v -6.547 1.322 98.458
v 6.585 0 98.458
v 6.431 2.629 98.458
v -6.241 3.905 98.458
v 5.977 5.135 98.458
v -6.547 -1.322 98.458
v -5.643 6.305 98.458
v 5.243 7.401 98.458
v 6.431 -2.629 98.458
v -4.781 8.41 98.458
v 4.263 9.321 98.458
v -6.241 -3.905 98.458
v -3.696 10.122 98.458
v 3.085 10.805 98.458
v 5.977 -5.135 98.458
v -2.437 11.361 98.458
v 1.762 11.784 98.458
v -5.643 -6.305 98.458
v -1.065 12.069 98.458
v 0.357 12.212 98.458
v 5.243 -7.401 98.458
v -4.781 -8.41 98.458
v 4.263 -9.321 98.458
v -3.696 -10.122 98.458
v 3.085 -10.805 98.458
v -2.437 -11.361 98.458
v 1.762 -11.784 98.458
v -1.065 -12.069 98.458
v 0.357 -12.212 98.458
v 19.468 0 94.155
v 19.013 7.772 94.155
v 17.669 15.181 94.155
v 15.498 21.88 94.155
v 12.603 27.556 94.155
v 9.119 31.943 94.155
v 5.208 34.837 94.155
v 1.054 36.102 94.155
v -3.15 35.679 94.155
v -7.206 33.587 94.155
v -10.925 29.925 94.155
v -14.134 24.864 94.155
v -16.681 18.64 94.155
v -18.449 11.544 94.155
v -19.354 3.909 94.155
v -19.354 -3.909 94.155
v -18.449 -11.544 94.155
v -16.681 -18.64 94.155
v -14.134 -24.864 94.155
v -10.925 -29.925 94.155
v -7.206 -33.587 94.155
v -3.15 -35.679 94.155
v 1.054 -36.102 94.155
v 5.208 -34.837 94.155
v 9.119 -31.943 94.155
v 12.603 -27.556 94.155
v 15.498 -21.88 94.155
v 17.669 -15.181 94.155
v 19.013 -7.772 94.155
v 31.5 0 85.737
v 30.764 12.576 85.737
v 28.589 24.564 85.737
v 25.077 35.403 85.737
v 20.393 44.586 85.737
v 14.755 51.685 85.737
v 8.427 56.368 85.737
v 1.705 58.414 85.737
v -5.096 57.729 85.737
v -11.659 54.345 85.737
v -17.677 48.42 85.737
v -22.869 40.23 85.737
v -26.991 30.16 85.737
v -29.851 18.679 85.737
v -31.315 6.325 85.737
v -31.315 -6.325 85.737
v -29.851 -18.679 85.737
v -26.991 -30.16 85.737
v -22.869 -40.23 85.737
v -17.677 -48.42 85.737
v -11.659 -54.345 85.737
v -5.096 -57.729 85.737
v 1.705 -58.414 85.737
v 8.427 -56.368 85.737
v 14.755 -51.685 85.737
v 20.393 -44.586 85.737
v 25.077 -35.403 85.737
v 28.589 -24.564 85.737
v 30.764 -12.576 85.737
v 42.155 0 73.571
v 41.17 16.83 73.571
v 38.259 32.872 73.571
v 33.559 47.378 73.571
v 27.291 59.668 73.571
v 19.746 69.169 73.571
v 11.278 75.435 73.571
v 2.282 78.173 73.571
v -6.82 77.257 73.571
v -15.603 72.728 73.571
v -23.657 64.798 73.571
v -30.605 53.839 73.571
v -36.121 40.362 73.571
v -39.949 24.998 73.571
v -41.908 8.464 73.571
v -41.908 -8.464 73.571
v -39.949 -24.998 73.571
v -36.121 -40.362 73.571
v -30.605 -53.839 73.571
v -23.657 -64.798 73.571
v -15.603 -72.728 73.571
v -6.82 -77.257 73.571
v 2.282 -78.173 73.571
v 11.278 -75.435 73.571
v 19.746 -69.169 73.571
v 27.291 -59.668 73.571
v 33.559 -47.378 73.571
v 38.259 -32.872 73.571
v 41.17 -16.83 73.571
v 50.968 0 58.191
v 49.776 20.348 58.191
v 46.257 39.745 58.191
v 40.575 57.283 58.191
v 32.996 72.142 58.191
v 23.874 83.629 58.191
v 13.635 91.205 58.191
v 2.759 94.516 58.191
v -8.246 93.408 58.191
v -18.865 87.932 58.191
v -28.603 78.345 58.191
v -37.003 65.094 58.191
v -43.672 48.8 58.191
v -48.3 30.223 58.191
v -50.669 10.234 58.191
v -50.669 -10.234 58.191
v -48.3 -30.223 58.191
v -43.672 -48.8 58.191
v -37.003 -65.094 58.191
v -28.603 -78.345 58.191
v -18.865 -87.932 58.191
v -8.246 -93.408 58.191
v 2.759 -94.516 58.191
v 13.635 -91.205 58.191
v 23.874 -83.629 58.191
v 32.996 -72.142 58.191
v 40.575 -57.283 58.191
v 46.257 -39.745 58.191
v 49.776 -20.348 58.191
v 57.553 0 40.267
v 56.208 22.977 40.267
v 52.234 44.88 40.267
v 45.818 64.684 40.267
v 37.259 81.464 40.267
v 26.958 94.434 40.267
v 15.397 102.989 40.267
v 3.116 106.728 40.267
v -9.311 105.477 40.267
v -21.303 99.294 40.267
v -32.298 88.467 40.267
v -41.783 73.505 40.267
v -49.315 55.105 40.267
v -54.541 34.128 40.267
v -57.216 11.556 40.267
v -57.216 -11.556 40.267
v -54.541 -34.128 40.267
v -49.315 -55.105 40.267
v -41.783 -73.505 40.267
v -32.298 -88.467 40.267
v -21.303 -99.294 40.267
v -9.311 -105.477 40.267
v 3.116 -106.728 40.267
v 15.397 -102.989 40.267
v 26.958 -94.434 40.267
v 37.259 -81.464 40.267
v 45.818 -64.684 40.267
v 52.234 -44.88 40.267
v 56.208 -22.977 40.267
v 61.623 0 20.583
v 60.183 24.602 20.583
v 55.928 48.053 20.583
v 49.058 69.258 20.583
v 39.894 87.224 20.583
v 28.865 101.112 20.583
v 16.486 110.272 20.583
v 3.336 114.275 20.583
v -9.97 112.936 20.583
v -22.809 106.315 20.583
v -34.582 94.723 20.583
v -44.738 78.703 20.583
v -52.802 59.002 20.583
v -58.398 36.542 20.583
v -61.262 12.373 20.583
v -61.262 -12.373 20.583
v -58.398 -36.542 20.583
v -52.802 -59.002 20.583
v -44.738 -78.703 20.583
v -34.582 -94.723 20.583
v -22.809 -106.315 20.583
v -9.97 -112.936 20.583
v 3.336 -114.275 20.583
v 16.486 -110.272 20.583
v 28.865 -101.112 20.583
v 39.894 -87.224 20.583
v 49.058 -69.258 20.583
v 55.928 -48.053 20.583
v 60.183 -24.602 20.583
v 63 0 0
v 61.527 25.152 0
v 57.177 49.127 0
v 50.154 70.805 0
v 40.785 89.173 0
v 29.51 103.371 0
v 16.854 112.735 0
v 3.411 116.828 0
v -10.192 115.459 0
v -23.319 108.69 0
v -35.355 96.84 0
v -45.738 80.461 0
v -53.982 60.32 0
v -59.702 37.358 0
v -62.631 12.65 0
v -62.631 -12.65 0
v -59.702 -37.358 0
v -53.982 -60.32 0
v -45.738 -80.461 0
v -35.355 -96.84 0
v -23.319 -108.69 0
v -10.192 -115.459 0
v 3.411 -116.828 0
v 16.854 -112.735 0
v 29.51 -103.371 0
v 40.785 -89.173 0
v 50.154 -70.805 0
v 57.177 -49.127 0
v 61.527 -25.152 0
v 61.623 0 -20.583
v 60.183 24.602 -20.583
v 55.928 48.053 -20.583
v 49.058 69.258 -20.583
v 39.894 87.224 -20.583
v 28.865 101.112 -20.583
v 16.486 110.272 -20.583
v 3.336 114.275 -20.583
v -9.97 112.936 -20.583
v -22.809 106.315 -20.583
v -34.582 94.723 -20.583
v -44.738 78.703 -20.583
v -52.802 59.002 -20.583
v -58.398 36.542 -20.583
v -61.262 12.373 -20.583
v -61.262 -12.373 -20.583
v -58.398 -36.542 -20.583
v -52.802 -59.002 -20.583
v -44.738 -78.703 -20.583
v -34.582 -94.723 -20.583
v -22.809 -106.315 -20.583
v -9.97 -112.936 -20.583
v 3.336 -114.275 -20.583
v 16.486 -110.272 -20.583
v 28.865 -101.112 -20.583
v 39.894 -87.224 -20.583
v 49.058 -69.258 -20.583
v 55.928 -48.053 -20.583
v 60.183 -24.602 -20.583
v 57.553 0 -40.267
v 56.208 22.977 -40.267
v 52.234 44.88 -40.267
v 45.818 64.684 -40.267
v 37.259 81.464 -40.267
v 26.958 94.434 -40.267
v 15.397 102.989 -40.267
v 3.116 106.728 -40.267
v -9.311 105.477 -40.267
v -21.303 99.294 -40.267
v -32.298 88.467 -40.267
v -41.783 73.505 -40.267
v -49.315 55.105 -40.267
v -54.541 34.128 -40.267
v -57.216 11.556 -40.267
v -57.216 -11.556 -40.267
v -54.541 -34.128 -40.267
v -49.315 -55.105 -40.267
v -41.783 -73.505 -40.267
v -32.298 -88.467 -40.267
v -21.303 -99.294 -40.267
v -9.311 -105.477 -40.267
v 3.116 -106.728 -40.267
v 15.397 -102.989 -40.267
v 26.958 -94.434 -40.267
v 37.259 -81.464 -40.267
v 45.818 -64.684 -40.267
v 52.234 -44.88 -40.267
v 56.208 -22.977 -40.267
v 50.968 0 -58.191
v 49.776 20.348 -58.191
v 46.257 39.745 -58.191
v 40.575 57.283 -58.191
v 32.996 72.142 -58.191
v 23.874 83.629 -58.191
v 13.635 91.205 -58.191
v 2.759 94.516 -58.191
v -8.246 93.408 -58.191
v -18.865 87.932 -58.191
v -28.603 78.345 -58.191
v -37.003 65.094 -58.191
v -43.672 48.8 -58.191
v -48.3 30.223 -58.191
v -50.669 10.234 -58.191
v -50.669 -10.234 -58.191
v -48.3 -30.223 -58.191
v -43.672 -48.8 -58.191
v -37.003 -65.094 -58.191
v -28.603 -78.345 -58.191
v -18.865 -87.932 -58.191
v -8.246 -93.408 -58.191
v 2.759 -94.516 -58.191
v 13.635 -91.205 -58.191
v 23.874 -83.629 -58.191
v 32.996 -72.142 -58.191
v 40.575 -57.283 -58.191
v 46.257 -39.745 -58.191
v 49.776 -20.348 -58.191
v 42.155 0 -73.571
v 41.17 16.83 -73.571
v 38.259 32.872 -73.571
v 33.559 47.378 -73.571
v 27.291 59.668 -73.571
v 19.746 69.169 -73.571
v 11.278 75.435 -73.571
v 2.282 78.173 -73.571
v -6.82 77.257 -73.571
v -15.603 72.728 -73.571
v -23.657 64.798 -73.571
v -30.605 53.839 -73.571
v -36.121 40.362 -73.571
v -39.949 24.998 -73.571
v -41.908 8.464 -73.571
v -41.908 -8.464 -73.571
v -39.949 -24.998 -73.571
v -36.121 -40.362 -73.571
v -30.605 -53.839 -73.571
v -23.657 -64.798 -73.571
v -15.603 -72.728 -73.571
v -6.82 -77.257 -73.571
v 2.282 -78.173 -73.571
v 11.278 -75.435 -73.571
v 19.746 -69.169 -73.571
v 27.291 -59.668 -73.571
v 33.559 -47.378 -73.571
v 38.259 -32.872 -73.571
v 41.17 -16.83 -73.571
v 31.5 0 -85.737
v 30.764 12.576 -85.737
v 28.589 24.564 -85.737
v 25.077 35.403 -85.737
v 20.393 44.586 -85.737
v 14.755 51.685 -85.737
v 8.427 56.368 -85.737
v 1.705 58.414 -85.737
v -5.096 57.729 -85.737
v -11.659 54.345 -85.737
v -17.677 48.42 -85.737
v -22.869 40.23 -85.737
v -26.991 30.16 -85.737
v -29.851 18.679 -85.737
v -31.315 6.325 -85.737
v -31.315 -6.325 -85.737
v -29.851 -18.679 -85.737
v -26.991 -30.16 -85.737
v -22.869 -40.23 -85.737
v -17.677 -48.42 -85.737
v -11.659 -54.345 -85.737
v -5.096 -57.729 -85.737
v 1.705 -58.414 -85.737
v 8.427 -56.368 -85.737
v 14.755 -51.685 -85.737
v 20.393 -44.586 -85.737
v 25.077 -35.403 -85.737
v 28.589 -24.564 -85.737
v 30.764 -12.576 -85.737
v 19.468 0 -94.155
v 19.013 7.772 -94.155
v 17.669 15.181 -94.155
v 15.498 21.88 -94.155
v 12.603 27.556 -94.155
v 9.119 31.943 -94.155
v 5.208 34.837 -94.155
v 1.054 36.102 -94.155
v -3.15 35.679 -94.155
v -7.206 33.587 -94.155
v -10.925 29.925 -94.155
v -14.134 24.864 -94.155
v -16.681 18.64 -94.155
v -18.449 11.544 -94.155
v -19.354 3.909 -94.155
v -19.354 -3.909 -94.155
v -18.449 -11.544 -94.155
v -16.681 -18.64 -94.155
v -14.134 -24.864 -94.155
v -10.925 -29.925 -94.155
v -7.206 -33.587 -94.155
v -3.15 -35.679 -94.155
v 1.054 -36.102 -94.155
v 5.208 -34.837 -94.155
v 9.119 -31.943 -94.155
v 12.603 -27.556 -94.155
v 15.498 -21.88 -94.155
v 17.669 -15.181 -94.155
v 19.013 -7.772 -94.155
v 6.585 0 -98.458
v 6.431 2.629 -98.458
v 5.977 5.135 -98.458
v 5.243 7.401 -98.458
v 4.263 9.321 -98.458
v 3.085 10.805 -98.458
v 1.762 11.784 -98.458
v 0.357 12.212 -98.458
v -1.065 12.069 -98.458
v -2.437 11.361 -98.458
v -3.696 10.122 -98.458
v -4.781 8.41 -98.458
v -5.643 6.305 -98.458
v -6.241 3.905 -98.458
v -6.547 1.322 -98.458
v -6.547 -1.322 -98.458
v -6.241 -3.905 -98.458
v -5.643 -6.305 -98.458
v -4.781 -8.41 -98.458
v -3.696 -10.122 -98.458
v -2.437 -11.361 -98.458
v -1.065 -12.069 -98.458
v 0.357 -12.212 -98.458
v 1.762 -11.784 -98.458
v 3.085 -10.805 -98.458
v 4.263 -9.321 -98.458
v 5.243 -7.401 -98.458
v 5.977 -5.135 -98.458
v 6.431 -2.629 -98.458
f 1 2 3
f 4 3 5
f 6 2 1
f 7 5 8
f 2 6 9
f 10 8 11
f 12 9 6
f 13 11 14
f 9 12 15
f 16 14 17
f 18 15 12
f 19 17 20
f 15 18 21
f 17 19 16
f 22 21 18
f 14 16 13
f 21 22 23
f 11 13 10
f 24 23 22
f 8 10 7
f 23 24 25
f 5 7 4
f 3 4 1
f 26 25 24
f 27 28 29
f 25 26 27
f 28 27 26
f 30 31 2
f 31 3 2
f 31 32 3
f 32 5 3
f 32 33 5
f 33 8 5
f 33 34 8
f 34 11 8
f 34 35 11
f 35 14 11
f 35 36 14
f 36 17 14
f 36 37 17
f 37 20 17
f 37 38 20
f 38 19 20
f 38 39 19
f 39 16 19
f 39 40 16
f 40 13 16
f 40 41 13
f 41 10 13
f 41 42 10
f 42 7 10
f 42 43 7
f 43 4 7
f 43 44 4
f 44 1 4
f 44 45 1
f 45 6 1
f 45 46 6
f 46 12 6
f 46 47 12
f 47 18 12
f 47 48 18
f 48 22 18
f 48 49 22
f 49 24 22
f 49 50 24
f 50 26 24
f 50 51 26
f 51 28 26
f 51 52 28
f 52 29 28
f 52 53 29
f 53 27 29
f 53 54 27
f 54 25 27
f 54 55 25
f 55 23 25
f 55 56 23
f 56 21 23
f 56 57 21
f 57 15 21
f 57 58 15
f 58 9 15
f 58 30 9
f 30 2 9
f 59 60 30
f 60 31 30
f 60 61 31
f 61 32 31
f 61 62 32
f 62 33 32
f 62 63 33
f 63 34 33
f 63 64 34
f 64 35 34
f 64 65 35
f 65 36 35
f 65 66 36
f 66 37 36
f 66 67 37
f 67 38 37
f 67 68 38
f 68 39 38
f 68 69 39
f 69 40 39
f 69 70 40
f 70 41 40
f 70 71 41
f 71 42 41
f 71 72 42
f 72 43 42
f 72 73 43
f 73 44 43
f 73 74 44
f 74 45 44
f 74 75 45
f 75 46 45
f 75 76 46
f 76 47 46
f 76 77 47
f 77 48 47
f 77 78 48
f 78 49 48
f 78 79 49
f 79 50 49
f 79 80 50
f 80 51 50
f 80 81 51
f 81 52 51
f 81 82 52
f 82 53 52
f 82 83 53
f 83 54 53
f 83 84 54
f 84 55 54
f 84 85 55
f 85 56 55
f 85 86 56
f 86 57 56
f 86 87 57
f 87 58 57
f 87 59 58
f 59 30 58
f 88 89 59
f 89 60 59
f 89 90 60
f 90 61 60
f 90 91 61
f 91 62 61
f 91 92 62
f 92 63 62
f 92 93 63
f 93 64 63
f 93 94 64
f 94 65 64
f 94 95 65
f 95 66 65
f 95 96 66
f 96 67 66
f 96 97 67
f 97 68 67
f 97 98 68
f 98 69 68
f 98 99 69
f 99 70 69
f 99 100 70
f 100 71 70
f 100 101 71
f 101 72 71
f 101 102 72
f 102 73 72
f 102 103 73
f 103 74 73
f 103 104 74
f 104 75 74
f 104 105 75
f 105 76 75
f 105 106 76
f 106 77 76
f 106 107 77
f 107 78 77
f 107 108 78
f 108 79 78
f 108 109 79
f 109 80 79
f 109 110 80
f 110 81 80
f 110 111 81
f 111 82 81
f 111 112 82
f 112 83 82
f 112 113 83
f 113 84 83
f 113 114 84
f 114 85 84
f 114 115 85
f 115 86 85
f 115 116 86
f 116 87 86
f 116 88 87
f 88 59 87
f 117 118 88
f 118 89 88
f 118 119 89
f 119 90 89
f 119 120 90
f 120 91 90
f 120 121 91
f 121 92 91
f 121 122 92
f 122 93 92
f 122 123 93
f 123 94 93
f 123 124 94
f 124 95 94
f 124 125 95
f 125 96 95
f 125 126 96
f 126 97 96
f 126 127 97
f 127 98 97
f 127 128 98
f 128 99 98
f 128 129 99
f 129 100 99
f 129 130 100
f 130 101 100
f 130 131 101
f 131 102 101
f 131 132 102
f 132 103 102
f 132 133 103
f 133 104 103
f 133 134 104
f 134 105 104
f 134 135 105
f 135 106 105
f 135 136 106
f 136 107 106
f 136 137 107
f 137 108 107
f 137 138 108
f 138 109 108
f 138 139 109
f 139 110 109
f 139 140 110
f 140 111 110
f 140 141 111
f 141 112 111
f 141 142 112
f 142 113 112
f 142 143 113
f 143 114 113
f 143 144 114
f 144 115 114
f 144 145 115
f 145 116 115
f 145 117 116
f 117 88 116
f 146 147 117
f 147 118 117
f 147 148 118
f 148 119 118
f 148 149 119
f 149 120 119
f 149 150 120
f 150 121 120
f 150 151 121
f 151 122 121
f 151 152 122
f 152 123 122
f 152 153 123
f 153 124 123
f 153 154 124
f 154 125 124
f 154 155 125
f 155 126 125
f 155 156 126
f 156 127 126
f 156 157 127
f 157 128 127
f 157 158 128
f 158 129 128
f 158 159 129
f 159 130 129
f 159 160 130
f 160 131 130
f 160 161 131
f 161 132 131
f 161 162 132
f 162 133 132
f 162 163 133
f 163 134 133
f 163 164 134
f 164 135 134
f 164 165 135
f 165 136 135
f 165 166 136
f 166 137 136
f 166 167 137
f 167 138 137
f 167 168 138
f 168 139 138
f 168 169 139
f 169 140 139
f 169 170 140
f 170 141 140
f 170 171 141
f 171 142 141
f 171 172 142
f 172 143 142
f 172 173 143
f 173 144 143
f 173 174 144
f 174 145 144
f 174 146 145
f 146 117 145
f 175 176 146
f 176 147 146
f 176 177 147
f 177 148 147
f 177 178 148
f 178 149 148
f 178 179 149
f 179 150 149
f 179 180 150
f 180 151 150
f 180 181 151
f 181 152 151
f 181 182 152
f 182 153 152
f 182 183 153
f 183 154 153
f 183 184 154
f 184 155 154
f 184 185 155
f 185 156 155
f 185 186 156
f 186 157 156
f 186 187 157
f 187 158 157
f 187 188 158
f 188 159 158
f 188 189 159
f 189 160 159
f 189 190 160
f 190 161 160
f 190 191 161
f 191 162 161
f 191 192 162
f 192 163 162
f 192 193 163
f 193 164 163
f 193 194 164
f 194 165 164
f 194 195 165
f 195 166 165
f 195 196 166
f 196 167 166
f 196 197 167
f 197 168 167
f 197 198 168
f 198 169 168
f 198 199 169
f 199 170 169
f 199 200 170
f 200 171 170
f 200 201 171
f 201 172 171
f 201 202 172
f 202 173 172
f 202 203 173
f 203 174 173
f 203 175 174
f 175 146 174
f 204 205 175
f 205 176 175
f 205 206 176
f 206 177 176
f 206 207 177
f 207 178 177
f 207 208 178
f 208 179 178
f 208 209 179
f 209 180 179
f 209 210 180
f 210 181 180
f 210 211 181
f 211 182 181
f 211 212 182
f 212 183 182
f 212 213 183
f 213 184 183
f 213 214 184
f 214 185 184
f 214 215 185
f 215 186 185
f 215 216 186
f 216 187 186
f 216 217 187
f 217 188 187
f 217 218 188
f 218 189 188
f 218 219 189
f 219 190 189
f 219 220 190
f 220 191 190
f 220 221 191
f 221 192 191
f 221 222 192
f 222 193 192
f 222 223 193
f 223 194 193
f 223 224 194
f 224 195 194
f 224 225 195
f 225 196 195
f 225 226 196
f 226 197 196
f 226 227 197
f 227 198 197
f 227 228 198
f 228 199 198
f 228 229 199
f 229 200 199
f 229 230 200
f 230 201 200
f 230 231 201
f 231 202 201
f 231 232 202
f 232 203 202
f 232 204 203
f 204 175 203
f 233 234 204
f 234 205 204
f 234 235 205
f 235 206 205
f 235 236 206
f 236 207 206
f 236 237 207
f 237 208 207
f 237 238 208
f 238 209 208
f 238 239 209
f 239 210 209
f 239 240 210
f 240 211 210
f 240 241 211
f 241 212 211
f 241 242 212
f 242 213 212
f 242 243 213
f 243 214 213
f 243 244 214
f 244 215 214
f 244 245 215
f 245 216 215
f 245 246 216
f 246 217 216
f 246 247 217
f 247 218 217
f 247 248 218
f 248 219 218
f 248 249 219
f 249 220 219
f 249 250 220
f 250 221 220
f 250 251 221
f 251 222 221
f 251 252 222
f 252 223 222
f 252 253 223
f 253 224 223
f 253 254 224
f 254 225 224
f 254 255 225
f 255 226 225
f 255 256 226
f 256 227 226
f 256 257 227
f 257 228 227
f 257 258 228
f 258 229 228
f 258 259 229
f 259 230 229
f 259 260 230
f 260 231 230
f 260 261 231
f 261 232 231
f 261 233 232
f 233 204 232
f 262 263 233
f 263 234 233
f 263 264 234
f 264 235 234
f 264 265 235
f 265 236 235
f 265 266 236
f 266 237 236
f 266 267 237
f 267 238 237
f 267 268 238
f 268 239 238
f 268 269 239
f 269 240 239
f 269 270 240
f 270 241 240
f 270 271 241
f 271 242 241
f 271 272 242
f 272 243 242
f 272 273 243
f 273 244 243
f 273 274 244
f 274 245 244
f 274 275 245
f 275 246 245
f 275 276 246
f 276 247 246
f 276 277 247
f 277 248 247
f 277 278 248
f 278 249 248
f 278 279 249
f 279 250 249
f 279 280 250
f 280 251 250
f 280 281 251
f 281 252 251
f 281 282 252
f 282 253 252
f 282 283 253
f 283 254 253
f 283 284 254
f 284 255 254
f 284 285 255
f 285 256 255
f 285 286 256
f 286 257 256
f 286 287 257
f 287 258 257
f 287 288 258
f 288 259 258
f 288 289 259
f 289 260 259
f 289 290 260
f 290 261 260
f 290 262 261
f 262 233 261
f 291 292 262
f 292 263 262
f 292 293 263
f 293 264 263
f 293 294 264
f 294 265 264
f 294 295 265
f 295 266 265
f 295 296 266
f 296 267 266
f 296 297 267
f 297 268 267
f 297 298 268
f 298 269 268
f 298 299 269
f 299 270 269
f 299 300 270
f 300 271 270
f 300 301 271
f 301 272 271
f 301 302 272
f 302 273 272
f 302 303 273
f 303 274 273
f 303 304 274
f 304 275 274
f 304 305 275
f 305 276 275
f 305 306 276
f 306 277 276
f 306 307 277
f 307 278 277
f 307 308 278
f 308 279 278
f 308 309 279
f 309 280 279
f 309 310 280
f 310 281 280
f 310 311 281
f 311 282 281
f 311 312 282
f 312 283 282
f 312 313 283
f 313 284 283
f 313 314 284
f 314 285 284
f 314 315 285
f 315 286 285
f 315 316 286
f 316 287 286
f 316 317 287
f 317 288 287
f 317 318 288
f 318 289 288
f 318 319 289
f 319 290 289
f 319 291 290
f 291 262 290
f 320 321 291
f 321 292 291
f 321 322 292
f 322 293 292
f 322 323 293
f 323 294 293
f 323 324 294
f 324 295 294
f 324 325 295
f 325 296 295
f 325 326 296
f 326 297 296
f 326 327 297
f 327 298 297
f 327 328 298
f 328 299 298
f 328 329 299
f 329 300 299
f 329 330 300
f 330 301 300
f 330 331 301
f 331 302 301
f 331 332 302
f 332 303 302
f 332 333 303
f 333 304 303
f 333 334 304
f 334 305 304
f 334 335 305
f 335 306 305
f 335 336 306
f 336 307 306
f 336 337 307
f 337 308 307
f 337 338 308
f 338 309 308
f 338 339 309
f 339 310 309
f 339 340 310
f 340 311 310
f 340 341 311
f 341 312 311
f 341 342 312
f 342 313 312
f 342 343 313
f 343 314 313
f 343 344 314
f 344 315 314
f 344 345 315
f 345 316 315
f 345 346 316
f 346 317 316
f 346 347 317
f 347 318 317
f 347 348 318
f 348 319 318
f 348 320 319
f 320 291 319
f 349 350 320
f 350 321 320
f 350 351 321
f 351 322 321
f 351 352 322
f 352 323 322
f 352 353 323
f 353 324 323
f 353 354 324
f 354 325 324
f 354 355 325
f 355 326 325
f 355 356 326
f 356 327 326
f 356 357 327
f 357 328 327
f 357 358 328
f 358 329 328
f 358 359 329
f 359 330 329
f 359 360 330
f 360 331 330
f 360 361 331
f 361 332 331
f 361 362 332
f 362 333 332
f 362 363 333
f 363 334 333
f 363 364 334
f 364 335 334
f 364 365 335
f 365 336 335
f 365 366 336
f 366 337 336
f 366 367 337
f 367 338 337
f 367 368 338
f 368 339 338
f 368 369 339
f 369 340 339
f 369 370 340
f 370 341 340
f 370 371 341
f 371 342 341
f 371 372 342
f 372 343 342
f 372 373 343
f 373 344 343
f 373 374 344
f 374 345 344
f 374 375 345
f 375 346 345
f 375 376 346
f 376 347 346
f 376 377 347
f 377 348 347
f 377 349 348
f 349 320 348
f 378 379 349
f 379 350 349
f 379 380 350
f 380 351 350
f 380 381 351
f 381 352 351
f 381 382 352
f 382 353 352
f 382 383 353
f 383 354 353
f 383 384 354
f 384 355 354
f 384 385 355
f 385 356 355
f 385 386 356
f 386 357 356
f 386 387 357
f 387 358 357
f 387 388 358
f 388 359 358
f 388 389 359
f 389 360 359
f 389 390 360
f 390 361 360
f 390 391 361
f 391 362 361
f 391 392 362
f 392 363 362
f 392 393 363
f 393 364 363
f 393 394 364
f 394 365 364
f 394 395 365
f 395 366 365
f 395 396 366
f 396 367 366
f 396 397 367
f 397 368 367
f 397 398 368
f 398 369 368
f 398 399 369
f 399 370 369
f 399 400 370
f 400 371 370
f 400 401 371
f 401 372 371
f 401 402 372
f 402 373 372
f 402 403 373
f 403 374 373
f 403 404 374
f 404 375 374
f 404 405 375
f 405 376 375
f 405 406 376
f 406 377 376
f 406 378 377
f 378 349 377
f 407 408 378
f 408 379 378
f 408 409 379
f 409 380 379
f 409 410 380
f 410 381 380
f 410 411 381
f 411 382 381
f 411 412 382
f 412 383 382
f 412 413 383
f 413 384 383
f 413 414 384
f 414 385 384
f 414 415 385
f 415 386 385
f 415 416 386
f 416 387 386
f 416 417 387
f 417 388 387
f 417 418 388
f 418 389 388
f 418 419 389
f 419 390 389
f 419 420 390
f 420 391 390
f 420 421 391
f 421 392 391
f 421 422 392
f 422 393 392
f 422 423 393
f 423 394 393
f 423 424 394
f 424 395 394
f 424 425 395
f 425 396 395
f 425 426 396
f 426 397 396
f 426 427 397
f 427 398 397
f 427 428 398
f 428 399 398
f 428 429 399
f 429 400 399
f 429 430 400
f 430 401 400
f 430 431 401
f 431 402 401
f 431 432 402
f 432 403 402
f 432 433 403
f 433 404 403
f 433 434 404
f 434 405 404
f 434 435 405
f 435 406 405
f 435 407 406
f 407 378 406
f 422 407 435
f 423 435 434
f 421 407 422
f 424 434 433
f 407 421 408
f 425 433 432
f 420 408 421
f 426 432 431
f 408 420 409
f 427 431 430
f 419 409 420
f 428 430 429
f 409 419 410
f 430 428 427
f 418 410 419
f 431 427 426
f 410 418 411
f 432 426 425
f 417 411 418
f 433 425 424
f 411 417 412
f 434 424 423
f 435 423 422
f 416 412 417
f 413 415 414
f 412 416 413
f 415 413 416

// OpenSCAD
// Generated by SolidPython 1.0.1 on 2020-07-29 00:46:47


scale(v = [7, 13, 11]) {
	sphere(r = 9);
}
/***********************************************
*********      SolidPython code:      **********
************************************************
 
# import packages: SolidPython
from solid import *
from solid.utils import *
from itertools import chain, combinations, permutations


class Resize:

    def __init__(self, scad_file):
        self.scad_file = scad_file
        #self.scad_file = import_scad(scad_file)
        # cone/cylinder param:
        self.r1 = 0
        self.r2 = 0
        self.h = 0
        # rectangular prism param:
        self.w = 0
        self.l = 0
        # ellipse param:
        self.r = 0

    # import OpenScad code (file name corresponds to shape)


    # classify shape + parameters
    def assign(self, param1, param2, param3):
        if self.scad_file == 'cone.scad':
            self.r1 = param1
            self.r2 = param2
            self.h = param3
        elif self.scad_file == 'cylinder.scad':
            self.r1 = param1
            self.r2 = param2
            self.h = param3
        elif self.scad_file == 'rectangularPrism.scad':
            self.h = param1
            self.l = param2
            self.w = param3
        else:
            self.r = param1
            self.h = param2

    # resize parameters
    def iterate(self):
        x = range(3, 20, 2)
        i = 1
        if self.scad_file == 'cone.scad':
            tempList = list(permutations(x, 2))
            for temp in tempList:
                param1 = temp[0]
                param2 = temp[1]
                filepath = 'produced_scad_files/' + 'cone' + str(param1) + '_' + str(param2) + '_' + '.scad'
                scad_render_to_file(cylinder(h=param1, r1=param2, r2=0), filepath)

        elif self.scad_file == 'cylinder.scad':
            tempList = list(permutations(x, 3))
            for temp in tempList:
                param1 = temp[0]
                param2 = temp[1]
                filepath = 'produced_scad_files/' + 'cylinder' + str(param1) + '_' + str(param2) + '_' + '.scad'
                scad_render_to_file(cylinder(h=param1, r1=param2, r2=param2), filepath)

        elif self.scad_file == 'rectangularPrism.scad':
            tempList = list(permutations(x, 3))
            for temp in tempList:
                param1 = temp[0]
                param2 = temp[1]
                param3 = temp[2]
                filepath = 'produced_scad_files/' + 'rectangularPrism' + str(param1) + '_' + str(param2) + '_' + str(
                    param3) + '.scad'
                scad_render_to_file(cube(size=(param1, param2, param3)), filepath)

        elif self.scad_file == 'ellipse.scad':
            tempList = list(permutations(x, 4))
            for temp in tempList:
                param1 = temp[0]
                param2 = temp[1]
                param3 = temp[2]
                param4 = temp[3]
                filepath = 'produced_scad_files/' + 'ellipse' + str(param1) + '_' + str(param2) + '_' + str(param3) + '_' + str(param4) + '.scad'
                scad_render_to_file(scale([param1, param2, param3])(sphere(r=param4)), filepath)

    def render_to_scadfile(self):
        scad_render_to_file(scad, 'example.scad') 
 
************************************************/
